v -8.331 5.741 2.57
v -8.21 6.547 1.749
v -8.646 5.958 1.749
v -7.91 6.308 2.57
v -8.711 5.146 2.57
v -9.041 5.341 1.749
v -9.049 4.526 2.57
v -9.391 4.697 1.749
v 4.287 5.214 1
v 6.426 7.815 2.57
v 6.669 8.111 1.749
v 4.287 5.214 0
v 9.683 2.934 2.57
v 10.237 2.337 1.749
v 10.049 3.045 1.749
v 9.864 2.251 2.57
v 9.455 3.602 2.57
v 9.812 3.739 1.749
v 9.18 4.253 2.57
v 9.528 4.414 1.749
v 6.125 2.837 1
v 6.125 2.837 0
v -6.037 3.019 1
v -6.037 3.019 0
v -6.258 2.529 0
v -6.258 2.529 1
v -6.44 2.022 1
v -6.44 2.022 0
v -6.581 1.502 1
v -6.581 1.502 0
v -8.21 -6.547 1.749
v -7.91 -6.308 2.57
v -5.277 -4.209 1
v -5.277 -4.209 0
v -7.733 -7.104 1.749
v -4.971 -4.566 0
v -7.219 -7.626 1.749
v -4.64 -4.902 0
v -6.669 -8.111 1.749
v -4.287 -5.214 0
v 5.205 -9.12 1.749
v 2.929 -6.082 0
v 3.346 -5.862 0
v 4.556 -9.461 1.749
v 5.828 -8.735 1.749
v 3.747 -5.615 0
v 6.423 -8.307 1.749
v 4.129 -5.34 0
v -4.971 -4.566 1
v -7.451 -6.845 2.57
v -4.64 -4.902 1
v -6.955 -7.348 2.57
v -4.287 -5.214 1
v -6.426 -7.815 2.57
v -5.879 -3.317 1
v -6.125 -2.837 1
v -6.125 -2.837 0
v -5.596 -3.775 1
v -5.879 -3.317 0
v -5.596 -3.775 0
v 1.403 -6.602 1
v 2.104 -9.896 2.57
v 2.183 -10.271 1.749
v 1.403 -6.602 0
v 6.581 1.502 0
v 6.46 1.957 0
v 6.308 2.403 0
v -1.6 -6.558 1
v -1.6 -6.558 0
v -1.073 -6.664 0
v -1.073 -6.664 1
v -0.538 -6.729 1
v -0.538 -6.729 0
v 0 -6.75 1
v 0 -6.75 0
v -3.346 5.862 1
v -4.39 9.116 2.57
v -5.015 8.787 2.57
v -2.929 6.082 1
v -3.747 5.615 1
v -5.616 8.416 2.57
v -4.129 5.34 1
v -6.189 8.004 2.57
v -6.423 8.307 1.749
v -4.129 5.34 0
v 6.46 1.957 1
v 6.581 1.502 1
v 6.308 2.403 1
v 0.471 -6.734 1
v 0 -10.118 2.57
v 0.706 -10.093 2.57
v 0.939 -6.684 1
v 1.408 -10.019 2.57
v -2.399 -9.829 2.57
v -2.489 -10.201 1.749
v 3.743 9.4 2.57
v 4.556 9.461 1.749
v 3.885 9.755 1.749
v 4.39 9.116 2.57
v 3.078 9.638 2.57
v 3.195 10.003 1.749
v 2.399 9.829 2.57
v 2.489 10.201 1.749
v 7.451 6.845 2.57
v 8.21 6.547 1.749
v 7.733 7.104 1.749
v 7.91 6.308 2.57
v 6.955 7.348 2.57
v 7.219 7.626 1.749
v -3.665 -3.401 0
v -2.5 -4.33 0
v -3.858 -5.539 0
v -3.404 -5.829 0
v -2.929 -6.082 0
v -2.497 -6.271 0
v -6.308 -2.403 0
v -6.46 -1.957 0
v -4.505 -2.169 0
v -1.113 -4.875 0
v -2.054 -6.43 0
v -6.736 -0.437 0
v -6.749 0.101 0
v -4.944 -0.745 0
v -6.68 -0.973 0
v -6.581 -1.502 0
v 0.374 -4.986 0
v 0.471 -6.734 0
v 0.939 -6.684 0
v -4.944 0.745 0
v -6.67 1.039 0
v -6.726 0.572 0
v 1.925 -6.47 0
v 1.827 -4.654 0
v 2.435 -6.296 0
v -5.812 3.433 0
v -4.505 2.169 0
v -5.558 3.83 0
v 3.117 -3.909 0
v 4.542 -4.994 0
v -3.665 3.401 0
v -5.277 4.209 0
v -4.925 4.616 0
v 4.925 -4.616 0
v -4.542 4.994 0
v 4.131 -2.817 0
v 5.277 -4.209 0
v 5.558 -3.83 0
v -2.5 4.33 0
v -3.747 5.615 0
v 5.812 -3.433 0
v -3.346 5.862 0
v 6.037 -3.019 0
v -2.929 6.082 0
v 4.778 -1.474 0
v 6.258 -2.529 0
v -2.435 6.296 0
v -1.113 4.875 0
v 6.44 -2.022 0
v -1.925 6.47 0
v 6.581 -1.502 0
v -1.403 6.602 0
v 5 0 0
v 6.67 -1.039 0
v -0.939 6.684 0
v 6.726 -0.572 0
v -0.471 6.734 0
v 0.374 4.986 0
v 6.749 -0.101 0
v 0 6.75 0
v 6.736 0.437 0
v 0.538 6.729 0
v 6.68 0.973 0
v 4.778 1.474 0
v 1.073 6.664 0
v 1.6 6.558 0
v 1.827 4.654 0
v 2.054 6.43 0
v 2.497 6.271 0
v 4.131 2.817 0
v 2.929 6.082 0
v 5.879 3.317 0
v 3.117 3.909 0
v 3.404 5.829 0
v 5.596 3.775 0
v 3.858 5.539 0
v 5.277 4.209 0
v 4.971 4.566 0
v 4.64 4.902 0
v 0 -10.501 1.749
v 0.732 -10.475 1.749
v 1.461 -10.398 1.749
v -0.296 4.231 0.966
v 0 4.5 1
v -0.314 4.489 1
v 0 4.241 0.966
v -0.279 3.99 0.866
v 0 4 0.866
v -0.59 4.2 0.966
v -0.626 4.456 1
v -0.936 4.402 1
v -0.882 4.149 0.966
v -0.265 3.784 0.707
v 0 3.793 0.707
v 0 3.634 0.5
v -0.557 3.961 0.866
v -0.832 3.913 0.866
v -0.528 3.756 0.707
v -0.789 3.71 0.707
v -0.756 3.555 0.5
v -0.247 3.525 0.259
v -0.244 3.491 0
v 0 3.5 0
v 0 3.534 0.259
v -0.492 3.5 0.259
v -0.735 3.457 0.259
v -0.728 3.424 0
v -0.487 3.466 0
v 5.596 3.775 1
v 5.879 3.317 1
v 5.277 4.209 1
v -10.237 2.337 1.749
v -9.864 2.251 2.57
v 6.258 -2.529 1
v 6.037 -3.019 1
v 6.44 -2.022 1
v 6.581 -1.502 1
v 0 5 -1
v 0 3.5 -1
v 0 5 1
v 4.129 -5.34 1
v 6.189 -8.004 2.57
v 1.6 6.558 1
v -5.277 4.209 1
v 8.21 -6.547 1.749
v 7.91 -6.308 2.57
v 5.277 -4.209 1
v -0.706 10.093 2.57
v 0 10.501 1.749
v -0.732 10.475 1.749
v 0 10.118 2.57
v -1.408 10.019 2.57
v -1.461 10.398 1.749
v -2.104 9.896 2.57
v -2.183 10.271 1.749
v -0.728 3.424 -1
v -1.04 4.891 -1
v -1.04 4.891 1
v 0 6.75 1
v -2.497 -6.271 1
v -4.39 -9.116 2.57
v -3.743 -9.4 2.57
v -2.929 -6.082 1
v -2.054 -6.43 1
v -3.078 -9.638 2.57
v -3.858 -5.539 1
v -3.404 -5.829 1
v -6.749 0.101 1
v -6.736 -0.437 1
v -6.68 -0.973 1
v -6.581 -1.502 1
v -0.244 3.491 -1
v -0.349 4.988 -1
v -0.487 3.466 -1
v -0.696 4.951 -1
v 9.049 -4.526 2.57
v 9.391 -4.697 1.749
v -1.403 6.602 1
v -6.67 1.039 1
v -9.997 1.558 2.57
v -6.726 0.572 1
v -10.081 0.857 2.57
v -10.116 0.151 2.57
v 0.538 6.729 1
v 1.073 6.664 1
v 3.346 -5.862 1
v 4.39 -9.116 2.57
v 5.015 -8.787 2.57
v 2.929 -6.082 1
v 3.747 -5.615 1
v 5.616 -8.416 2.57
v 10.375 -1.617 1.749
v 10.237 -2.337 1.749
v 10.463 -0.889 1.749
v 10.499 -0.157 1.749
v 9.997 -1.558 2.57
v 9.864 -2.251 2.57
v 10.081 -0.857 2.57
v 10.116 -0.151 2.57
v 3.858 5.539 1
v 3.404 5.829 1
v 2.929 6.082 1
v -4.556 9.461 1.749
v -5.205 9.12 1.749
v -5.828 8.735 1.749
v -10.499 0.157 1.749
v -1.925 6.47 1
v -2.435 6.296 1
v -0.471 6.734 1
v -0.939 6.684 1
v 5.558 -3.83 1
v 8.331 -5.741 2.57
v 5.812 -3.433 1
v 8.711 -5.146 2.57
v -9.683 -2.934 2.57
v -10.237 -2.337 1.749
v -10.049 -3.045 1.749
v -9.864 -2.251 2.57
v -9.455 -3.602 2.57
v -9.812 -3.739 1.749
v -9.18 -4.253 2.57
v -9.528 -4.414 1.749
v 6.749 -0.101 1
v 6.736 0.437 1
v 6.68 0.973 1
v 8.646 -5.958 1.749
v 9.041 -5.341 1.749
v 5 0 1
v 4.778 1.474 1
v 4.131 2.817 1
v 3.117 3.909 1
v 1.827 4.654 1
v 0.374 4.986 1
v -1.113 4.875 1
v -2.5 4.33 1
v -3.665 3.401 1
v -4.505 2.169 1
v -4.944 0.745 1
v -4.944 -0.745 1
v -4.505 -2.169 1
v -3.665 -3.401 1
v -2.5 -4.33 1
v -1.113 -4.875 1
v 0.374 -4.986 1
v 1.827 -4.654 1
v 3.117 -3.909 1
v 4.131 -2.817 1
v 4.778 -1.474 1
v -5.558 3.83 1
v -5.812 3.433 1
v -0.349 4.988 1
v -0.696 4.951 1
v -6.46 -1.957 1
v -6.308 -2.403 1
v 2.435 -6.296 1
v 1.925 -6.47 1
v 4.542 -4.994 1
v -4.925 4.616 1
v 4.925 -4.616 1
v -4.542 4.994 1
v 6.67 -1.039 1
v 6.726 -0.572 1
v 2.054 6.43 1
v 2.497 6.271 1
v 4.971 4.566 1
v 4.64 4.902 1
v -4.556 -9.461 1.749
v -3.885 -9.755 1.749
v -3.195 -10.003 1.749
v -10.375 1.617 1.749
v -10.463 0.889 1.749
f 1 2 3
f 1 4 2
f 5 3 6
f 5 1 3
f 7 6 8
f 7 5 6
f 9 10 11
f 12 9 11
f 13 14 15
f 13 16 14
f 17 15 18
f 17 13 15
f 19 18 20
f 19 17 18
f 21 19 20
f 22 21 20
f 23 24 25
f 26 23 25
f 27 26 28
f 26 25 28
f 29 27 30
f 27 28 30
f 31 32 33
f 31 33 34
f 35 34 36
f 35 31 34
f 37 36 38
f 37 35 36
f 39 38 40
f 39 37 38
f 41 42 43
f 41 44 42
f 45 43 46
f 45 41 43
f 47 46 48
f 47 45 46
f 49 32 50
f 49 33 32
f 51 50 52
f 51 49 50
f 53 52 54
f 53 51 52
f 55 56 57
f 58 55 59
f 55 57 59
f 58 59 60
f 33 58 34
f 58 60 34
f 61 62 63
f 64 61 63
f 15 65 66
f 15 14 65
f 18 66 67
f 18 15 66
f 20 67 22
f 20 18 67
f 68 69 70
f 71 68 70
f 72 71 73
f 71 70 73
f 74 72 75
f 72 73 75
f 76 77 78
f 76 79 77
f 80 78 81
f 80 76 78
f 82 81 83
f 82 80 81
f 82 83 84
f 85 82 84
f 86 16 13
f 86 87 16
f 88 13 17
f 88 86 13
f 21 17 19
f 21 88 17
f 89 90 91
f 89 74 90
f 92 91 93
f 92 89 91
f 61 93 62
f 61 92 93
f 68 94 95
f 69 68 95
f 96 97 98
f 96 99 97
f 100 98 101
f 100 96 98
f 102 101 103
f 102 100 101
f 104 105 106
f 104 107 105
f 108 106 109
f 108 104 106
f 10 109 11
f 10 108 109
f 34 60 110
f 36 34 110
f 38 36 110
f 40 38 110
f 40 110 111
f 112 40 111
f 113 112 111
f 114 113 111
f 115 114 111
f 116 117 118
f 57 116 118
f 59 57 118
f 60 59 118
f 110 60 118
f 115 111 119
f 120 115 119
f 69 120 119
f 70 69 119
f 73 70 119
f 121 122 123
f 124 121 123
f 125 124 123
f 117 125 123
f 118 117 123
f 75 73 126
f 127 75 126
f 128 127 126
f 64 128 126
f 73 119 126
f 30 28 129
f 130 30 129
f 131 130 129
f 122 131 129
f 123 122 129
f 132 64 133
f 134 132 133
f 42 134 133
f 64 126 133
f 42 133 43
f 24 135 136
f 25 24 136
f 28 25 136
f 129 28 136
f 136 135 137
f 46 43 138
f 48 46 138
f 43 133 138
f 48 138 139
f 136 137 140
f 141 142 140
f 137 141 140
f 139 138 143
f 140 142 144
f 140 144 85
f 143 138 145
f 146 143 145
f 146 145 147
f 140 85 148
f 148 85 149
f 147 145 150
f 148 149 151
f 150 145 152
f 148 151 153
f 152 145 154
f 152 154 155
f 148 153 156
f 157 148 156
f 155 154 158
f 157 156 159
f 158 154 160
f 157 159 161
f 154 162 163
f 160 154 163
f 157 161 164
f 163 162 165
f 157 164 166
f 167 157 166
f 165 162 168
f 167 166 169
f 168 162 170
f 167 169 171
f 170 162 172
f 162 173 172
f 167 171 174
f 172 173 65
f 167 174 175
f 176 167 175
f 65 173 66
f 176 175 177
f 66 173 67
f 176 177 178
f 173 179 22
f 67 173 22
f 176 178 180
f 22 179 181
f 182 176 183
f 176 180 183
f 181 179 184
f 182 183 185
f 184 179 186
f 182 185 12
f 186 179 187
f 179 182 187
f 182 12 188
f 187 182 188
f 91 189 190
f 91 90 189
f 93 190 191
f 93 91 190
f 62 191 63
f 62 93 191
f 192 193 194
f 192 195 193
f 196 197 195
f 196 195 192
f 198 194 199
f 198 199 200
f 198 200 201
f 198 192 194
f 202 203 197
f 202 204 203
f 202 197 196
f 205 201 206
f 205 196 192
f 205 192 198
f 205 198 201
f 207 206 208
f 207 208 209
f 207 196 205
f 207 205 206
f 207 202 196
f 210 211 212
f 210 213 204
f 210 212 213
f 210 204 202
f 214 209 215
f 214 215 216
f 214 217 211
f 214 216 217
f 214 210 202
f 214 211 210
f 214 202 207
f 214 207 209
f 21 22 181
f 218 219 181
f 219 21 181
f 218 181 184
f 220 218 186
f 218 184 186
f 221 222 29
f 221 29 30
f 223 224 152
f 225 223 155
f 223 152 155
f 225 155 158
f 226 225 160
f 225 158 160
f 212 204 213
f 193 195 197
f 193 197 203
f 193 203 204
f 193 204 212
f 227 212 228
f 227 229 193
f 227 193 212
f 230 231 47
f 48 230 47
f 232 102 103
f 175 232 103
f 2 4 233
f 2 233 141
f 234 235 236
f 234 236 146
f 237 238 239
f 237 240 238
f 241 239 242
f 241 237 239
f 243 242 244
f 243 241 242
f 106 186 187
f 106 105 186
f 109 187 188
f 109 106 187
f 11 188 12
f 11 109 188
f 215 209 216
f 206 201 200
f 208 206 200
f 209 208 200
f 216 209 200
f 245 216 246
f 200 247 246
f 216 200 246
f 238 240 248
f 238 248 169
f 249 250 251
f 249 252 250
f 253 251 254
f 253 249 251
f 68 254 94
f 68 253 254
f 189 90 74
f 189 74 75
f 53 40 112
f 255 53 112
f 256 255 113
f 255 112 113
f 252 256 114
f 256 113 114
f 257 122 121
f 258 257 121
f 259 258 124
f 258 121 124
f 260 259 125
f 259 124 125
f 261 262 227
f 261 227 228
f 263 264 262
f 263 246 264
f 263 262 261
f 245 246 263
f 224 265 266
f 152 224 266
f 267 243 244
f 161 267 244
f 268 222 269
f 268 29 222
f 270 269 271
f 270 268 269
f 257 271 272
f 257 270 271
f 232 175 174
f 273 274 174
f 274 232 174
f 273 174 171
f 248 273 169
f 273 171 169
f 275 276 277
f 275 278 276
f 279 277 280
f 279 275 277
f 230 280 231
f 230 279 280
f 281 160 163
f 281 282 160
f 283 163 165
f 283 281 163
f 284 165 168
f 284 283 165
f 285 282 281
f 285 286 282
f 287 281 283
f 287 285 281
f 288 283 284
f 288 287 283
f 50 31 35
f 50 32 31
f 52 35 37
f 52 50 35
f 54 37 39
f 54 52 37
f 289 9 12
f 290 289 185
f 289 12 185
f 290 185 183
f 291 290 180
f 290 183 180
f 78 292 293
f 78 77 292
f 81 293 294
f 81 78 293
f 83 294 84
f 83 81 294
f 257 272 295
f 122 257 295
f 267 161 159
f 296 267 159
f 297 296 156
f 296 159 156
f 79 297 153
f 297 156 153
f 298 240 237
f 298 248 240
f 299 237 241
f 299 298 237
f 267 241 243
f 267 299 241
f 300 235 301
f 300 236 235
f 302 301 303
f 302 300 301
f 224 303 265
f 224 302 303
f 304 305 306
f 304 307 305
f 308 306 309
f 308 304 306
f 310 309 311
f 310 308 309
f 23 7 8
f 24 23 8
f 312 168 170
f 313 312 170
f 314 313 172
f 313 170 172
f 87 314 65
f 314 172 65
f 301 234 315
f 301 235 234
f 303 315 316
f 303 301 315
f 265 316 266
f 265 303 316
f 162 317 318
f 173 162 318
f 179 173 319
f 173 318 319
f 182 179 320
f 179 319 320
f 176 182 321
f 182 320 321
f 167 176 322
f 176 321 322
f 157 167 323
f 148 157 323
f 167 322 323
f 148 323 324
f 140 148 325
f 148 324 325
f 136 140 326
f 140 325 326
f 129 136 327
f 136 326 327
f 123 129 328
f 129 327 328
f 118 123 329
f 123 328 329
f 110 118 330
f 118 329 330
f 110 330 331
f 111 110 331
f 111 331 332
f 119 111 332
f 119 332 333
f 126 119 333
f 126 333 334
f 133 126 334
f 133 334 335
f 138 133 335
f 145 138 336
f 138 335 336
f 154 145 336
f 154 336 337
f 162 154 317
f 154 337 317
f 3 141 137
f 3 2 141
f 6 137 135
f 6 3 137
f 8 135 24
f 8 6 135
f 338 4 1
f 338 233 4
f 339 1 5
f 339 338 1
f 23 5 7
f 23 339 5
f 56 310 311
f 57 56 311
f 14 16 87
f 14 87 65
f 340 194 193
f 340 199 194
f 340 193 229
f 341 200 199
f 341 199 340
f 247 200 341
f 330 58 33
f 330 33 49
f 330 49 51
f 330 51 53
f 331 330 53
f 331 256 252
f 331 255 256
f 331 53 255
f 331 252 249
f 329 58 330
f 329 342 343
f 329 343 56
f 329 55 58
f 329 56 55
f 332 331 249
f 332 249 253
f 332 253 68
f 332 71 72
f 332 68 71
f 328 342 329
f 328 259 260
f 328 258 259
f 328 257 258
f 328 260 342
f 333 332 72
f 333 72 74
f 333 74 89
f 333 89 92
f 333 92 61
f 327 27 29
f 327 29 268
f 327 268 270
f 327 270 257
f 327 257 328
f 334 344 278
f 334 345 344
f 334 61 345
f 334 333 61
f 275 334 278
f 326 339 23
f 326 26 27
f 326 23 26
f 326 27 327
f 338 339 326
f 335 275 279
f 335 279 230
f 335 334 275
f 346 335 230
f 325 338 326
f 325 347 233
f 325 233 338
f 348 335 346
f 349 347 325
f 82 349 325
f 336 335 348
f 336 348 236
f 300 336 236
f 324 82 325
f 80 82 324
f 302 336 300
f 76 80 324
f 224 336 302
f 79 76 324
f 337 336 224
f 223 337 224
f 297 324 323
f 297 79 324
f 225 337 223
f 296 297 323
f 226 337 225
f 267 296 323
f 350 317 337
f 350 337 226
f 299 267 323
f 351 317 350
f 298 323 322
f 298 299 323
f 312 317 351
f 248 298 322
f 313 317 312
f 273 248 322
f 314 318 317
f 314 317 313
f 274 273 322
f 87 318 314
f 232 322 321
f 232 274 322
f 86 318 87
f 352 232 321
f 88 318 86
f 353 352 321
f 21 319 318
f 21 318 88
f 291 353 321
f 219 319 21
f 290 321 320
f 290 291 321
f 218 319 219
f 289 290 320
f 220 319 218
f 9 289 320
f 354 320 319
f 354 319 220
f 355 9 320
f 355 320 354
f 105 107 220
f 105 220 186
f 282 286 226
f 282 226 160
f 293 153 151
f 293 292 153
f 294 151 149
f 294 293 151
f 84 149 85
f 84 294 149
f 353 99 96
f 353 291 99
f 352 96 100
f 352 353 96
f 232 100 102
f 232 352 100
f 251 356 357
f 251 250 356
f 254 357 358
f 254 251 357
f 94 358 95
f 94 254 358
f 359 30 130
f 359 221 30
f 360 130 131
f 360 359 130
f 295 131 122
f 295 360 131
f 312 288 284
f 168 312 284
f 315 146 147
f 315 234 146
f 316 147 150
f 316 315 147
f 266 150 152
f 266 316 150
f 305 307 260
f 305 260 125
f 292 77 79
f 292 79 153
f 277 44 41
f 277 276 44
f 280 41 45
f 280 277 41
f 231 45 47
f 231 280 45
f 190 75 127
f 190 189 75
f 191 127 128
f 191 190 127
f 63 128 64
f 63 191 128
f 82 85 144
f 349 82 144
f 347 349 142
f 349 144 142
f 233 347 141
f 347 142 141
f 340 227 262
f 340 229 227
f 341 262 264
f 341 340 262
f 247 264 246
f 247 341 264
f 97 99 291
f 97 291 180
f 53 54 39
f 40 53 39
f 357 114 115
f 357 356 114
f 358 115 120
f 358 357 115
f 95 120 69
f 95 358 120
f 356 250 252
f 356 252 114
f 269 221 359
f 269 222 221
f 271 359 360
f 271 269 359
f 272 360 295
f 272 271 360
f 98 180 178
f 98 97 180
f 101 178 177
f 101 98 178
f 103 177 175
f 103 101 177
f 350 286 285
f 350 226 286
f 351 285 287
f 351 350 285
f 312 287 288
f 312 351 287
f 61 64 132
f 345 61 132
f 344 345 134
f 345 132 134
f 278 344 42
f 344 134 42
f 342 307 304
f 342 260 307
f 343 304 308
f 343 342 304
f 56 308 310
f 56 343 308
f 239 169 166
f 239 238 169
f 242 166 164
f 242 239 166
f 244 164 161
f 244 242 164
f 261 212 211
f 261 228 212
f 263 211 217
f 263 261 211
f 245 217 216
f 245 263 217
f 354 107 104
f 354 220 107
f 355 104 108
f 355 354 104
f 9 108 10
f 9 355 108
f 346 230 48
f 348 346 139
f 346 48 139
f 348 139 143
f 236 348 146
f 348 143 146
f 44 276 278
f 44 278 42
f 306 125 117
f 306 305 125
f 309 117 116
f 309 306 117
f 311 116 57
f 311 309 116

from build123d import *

# Parameters (mm, degrees)
SKETCH1_R           = 6.75
BOSS_EXTRUDE1_DEPTH = 1
SKETCH2_R           = 5
CUT_EXTRUDE1_DEPTH  = 1
REVOLVE3_ANGLE      = 12
CIRPATTERN1_COUNT   = 14
REVOLVE4_ANGLE      = 12


with BuildPart() as part:
    # Sketch1 → Boss-Extrude1 (new body)
    with BuildSketch(Plane.XY):
        Circle(SKETCH1_R)
    extrude(amount=BOSS_EXTRUDE1_DEPTH)

    # Sketch2 → Cut-Extrude1 (cut)
    with BuildSketch(Plane.XY.offset(1)):
        Circle(SKETCH2_R)
    extrude(amount=-CUT_EXTRUDE1_DEPTH, mode=Mode.SUBTRACT)

    # Sketch3 → Revolve3 (revolve)
    with BuildSketch(Plane(origin=(0, 0, 0), x_dir=(0, 0, -1), z_dir=(1, 0, 0))):
        Polygon((0, 6.75), (-1.74892584, 10.500583567), (-2.570319645, 10.117561345), (-1, 6.75), align=None)
    revolve3 = revolve(axis=Axis((0, 0, -0.128515982), (0, 0, 1)), revolution_arc=REVOLVE3_ANGLE)

    # CirPattern1: Revolve3 ×14 about axis
    cirpattern1_axis = Axis((0, 0, 0), (0, 0, 1))
    for i in range(1, CIRPATTERN1_COUNT):
        add(revolve3.rotate(cirpattern1_axis, i * 360 / CIRPATTERN1_COUNT))


with BuildPart() as body_2:
    # Sketch4 → Revolve4 (revolve)
    with BuildSketch(Plane(origin=(0, 0, 0), x_dir=(0, 0, -1), z_dir=(1, 0, 0))):
        with BuildLine():
            Line((0, 3.5), (1, 3.5))
            Line((1, 3.5), (1, 5))
            Line((1, 5), (-1, 5))
            Line((-1, 5), (-1, 4.5))
            ThreePointArc((-1, 4.5), (-0.707106781, 3.792893219), (0, 3.5))
        make_face()
    revolve(axis=Axis((0, 0, -0.128515982), (0, 0, 1)), revolution_arc=REVOLVE4_ANGLE)


solid = Compound([part.part, body_2.part])
